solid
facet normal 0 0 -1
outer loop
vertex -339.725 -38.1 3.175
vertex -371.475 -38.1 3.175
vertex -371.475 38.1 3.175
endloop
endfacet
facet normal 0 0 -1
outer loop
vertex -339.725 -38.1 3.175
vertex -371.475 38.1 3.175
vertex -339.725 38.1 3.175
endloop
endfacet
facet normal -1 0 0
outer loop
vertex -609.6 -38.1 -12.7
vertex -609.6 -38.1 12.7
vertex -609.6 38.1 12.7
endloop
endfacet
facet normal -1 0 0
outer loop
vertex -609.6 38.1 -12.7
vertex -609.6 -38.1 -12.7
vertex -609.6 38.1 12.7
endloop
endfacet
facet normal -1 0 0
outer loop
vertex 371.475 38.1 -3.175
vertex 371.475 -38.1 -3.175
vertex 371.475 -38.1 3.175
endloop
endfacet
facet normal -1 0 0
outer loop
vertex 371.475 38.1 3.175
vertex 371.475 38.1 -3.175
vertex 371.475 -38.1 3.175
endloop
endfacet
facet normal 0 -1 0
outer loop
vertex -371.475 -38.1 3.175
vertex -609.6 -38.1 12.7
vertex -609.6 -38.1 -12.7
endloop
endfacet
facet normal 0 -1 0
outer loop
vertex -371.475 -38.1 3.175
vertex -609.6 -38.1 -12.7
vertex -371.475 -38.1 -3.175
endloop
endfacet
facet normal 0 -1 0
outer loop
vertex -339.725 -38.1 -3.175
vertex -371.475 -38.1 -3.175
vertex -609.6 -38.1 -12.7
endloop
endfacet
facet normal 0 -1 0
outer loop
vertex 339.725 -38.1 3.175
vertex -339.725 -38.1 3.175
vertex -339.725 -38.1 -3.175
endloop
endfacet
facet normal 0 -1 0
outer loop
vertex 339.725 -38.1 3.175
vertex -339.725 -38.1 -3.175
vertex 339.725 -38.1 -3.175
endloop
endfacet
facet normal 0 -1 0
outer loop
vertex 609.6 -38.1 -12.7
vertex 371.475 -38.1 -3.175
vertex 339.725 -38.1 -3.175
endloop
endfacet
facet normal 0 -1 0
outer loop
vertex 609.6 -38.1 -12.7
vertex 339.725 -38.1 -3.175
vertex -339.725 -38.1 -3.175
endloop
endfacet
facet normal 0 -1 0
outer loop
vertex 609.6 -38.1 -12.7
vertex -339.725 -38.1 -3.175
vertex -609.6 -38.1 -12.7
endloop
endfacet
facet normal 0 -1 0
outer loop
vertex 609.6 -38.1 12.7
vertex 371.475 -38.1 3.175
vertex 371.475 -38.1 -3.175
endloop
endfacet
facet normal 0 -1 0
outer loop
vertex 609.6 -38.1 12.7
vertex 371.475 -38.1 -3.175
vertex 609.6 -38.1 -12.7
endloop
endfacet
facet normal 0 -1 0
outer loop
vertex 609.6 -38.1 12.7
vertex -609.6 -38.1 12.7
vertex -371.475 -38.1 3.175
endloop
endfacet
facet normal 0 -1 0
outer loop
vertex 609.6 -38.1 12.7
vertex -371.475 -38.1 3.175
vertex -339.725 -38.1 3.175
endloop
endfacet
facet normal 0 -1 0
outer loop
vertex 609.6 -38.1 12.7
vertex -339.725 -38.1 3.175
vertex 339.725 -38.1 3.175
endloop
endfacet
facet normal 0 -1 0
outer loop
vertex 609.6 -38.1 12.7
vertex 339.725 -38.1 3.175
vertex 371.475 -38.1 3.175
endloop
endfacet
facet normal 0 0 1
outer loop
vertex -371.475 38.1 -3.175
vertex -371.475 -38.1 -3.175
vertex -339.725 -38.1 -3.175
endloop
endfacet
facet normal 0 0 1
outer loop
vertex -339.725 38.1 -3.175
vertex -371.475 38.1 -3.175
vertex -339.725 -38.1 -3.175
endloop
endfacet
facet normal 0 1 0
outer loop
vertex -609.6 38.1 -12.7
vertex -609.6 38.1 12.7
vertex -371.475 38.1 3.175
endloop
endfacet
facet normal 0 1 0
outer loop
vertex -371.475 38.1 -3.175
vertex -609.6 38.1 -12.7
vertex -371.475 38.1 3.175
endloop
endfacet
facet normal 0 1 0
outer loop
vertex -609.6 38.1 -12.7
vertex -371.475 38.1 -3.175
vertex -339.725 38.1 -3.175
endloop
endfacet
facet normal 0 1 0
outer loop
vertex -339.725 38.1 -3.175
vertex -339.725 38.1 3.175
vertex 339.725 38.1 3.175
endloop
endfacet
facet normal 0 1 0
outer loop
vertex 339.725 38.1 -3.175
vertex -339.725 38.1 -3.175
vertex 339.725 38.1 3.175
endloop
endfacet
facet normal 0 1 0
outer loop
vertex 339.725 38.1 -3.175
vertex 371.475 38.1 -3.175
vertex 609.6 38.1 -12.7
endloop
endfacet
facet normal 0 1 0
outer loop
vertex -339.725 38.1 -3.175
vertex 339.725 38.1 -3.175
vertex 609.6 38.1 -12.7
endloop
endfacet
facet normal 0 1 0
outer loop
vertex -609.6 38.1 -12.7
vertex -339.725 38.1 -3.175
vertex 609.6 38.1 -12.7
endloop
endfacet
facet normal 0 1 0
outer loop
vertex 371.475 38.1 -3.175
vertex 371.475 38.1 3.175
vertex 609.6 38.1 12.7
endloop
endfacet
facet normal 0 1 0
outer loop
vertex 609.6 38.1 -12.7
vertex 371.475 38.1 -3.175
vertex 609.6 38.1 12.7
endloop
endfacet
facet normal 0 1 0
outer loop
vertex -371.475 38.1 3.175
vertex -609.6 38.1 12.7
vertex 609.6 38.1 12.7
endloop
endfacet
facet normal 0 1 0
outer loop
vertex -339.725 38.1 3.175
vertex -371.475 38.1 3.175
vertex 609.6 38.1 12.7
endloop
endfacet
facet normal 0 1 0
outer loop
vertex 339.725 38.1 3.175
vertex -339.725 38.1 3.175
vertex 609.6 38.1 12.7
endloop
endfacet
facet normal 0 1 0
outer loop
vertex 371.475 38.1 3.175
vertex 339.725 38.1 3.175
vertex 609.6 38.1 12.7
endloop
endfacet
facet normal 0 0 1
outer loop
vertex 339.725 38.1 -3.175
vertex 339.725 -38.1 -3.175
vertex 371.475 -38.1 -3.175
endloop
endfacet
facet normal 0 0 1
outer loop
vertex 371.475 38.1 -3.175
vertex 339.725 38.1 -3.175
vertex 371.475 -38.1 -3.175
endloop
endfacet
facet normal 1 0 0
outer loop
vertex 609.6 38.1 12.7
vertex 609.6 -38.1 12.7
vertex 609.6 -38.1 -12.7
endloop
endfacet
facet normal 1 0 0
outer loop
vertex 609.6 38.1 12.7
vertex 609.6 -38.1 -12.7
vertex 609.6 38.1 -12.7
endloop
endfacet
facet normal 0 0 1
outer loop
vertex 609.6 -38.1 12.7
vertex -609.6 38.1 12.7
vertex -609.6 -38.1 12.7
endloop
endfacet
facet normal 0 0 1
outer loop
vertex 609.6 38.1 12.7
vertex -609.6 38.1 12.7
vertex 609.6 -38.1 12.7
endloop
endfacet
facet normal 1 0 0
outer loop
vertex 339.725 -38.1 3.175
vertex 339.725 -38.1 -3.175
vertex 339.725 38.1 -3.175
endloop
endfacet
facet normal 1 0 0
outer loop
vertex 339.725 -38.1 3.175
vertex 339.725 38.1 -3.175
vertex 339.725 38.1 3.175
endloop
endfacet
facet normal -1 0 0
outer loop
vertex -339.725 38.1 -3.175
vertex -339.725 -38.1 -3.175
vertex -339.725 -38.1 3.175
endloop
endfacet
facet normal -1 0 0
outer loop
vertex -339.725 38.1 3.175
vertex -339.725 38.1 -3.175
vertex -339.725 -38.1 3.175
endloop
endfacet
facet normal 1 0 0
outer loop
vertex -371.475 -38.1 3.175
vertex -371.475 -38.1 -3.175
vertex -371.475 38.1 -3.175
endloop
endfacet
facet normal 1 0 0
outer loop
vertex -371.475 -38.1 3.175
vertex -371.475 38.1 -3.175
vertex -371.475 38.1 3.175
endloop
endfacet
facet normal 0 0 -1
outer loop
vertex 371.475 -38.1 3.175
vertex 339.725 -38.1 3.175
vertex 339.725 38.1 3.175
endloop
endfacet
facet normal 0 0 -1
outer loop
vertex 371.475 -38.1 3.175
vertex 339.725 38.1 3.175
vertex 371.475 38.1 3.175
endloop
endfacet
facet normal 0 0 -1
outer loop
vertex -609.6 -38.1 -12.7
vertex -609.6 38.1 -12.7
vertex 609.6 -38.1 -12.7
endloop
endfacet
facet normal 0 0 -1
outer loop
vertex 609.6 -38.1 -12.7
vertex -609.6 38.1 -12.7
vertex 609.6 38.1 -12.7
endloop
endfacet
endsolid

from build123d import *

# Parameters (mm, degrees)
F0_W     = 1219.2
F0_H     = 76.2
F1_DEPTH = 12.7
F2_W     = 31.75
F2_H     = 6.35
F3_DEPTH = 76.2
F4_DEPTH = 76.2


with BuildPart() as f1:
    # F0 (on Top) → F1 (new body, symmetric)
    with BuildSketch(Plane.XY):
        Rectangle(F0_W, F0_H)
    extrude(amount=F1_DEPTH, both=True)

    # F2 (on face) → F3 (cut, through all)
    with BuildSketch(Plane.XZ.offset(38.1)):
        with Locations((-355.6, 0)):
            Rectangle(F2_W, F2_H)
    extrude(amount=-F3_DEPTH, mode=Mode.SUBTRACT)

    # F2 (on face) → F4 (cut, through all)
    with BuildSketch(Plane.XZ.offset(38.1)):
        with Locations((355.6, 0)):
            Rectangle(F2_W, F2_H)
    extrude(amount=-F4_DEPTH, mode=Mode.SUBTRACT)


solid = f1.part
